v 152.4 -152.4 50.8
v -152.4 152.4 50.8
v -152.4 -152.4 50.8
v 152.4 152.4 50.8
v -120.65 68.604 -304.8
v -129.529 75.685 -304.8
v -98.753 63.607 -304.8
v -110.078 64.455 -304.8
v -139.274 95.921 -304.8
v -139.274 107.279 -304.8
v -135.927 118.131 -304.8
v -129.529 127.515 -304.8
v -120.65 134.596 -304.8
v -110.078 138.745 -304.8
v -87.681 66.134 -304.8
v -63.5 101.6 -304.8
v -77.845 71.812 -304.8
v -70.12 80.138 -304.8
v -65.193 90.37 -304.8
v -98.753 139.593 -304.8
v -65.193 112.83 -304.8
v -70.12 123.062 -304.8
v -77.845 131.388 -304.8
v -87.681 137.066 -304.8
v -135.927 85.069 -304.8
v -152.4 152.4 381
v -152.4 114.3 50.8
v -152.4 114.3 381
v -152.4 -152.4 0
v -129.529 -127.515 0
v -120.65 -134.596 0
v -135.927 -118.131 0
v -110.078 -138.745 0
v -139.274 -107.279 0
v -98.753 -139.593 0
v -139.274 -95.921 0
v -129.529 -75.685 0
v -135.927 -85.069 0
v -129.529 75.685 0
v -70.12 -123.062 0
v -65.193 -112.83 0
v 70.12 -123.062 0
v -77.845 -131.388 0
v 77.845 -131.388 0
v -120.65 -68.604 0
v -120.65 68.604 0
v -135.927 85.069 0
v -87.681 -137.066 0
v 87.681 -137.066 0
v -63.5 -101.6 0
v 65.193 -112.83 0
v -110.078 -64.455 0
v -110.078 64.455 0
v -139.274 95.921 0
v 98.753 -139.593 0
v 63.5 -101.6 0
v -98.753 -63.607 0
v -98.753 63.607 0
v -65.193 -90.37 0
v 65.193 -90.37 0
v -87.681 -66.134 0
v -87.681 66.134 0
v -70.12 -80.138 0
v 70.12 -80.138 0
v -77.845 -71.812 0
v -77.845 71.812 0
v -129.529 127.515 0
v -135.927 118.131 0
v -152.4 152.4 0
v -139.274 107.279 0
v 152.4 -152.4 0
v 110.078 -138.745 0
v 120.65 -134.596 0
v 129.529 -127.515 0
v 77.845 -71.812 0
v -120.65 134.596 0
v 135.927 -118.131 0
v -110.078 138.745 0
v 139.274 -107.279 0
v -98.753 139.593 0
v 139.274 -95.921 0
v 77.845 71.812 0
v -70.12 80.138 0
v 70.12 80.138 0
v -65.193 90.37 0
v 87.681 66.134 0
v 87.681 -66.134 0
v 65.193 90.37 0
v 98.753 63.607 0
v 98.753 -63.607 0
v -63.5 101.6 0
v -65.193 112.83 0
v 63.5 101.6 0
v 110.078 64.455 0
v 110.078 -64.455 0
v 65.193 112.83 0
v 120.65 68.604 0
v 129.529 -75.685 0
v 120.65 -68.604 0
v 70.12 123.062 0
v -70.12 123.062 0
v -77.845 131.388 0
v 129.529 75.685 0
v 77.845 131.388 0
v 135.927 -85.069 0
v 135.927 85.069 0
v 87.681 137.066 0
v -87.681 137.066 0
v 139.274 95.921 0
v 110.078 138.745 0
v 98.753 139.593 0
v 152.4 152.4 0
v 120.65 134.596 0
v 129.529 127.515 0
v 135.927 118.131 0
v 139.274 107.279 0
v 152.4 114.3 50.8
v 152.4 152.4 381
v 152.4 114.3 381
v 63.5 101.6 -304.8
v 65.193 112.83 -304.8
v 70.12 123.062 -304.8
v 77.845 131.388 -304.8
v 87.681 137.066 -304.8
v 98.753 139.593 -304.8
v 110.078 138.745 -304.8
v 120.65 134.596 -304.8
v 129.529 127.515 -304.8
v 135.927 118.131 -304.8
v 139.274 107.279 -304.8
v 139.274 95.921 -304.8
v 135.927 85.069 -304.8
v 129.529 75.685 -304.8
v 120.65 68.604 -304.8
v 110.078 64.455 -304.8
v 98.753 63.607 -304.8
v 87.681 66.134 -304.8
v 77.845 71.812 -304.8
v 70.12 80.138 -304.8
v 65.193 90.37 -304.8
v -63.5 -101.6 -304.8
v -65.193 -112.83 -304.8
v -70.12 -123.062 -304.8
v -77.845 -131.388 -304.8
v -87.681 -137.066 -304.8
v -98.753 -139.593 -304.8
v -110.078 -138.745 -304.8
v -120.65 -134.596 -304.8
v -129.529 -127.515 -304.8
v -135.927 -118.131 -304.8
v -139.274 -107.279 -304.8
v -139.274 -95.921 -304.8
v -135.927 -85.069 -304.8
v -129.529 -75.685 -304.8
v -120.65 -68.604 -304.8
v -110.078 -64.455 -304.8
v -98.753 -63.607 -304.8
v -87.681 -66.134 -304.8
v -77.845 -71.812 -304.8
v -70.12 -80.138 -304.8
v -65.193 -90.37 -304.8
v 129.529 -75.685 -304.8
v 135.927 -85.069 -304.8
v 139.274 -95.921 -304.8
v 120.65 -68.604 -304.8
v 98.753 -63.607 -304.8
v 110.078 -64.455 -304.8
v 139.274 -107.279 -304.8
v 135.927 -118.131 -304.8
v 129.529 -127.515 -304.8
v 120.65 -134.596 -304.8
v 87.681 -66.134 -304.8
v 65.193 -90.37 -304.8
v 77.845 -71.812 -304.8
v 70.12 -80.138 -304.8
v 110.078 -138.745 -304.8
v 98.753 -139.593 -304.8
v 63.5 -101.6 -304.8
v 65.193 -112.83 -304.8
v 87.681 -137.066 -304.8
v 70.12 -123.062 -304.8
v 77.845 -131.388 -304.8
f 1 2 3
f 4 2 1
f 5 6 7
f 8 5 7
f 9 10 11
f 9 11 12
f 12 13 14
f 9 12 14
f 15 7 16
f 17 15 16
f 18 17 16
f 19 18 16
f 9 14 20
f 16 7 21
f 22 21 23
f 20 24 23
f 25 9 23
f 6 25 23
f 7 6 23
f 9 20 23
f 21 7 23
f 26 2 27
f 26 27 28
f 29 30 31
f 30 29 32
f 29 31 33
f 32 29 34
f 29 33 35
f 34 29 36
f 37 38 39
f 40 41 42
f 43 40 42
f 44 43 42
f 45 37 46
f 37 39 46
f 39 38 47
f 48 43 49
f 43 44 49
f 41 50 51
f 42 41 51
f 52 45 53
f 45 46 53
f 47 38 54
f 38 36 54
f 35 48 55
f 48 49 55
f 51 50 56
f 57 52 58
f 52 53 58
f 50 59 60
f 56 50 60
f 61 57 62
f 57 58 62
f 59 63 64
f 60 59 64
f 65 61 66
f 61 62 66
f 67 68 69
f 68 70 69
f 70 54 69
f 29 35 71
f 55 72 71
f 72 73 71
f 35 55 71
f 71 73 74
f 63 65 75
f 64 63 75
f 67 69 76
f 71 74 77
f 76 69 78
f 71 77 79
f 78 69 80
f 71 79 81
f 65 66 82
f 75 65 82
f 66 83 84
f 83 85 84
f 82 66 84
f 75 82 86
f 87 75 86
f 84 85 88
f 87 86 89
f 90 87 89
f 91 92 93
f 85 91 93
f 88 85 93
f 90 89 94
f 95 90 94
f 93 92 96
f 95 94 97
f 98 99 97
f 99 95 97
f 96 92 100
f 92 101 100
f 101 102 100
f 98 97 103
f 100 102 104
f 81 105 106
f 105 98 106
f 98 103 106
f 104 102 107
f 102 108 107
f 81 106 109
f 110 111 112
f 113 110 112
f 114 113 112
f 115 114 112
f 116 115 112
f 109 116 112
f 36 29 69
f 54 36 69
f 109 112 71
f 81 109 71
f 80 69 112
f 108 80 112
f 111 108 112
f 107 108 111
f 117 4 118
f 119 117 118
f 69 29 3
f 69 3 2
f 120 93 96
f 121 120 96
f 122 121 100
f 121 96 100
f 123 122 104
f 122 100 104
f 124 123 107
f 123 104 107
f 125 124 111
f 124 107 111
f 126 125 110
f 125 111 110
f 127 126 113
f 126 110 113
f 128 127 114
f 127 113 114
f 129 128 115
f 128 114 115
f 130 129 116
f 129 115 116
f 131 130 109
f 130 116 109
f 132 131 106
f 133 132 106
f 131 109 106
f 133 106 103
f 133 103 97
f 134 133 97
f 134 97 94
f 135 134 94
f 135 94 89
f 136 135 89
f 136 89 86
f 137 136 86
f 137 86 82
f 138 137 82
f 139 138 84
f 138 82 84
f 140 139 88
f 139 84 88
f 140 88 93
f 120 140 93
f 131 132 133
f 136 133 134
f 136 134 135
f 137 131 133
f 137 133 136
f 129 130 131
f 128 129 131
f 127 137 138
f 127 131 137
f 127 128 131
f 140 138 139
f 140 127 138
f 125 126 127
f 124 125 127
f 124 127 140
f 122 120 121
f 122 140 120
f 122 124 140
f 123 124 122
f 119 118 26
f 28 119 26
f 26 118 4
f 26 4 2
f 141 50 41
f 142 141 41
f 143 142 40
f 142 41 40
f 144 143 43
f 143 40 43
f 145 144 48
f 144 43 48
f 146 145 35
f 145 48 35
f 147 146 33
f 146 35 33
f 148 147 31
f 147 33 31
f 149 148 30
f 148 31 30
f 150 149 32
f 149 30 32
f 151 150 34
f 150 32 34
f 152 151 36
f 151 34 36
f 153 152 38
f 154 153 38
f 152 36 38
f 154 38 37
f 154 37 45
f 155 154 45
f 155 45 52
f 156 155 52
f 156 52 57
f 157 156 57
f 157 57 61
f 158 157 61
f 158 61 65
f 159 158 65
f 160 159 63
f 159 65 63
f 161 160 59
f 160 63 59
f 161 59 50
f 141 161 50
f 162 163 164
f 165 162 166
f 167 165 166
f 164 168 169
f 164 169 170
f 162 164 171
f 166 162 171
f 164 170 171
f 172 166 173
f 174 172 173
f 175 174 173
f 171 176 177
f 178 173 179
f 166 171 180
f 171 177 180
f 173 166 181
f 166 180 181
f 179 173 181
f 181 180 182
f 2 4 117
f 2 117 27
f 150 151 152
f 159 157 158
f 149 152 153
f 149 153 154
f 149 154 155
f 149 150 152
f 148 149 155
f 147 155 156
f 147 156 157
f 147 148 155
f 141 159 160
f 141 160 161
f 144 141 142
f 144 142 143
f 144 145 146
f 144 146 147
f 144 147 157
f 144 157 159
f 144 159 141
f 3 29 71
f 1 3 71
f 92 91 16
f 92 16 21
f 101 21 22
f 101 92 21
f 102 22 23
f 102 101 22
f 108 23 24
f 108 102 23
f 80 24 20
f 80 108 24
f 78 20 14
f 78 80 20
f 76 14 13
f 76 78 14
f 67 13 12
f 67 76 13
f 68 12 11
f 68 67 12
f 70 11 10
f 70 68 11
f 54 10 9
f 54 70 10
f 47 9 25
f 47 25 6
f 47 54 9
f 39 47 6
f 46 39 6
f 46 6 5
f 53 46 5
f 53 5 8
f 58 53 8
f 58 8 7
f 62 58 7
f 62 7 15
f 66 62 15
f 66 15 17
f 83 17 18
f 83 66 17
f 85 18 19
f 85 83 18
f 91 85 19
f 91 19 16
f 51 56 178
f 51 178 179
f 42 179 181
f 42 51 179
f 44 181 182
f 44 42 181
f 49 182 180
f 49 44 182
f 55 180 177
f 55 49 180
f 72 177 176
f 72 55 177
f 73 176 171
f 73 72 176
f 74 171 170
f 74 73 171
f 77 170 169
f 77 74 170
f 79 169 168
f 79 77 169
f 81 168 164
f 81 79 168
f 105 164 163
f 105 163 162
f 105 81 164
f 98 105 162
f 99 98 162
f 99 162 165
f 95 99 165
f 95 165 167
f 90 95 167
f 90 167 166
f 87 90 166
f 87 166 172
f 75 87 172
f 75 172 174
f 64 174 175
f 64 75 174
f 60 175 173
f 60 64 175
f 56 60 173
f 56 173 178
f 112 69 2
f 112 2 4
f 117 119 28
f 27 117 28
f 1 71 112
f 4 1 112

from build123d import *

# Parameters (mm, degrees)
F0_W     = 304.8
F0_H     = 304.8
F1_DEPTH = 50.8
F2_R     = 38.1
F3_DEPTH = 304.8
F6_W     = 304.8
F6_H     = 330.2
F7_DEPTH = 38.1


with BuildPart() as f1:
    # F0 (on Top) → F1 (new body)
    with BuildSketch(Plane.XY):
        Rectangle(F0_W, F0_H)
    extrude(amount=F1_DEPTH)

    # F4: F3 across plane


with BuildPart() as f3:
    # F2 (on face) → F3 (new body)
    with BuildSketch(Plane(origin=(0, 0, 0), x_dir=(1, 0, 0), z_dir=(0, 0, -1))):
        with Locations((-101.6, 101.6)):
            Circle(F2_R)
    extrude(amount=F3_DEPTH)


with BuildPart() as f1_1:
    add(f1.part)
    add(f3.part.mirror(Plane.XZ))


    add(f3.part)  # F5 merges F3
    # F5: F1 across plane


with BuildPart() as f1_2:
    add(f1_1.part)
    add(f1_1.part.mirror(Plane.YZ))


with BuildPart() as f7:
    # F6 (on face) → F7 (new body)
    with BuildSketch(Plane(origin=(0, 152.4, 0), x_dir=(-1, 0, 0), z_dir=(0, 1, 0))):
        with Locations((0, 215.9)):
            Rectangle(F6_W, F6_H)
    extrude(amount=-F7_DEPTH)


solid = Compound([f1_2.part, f7.part])
